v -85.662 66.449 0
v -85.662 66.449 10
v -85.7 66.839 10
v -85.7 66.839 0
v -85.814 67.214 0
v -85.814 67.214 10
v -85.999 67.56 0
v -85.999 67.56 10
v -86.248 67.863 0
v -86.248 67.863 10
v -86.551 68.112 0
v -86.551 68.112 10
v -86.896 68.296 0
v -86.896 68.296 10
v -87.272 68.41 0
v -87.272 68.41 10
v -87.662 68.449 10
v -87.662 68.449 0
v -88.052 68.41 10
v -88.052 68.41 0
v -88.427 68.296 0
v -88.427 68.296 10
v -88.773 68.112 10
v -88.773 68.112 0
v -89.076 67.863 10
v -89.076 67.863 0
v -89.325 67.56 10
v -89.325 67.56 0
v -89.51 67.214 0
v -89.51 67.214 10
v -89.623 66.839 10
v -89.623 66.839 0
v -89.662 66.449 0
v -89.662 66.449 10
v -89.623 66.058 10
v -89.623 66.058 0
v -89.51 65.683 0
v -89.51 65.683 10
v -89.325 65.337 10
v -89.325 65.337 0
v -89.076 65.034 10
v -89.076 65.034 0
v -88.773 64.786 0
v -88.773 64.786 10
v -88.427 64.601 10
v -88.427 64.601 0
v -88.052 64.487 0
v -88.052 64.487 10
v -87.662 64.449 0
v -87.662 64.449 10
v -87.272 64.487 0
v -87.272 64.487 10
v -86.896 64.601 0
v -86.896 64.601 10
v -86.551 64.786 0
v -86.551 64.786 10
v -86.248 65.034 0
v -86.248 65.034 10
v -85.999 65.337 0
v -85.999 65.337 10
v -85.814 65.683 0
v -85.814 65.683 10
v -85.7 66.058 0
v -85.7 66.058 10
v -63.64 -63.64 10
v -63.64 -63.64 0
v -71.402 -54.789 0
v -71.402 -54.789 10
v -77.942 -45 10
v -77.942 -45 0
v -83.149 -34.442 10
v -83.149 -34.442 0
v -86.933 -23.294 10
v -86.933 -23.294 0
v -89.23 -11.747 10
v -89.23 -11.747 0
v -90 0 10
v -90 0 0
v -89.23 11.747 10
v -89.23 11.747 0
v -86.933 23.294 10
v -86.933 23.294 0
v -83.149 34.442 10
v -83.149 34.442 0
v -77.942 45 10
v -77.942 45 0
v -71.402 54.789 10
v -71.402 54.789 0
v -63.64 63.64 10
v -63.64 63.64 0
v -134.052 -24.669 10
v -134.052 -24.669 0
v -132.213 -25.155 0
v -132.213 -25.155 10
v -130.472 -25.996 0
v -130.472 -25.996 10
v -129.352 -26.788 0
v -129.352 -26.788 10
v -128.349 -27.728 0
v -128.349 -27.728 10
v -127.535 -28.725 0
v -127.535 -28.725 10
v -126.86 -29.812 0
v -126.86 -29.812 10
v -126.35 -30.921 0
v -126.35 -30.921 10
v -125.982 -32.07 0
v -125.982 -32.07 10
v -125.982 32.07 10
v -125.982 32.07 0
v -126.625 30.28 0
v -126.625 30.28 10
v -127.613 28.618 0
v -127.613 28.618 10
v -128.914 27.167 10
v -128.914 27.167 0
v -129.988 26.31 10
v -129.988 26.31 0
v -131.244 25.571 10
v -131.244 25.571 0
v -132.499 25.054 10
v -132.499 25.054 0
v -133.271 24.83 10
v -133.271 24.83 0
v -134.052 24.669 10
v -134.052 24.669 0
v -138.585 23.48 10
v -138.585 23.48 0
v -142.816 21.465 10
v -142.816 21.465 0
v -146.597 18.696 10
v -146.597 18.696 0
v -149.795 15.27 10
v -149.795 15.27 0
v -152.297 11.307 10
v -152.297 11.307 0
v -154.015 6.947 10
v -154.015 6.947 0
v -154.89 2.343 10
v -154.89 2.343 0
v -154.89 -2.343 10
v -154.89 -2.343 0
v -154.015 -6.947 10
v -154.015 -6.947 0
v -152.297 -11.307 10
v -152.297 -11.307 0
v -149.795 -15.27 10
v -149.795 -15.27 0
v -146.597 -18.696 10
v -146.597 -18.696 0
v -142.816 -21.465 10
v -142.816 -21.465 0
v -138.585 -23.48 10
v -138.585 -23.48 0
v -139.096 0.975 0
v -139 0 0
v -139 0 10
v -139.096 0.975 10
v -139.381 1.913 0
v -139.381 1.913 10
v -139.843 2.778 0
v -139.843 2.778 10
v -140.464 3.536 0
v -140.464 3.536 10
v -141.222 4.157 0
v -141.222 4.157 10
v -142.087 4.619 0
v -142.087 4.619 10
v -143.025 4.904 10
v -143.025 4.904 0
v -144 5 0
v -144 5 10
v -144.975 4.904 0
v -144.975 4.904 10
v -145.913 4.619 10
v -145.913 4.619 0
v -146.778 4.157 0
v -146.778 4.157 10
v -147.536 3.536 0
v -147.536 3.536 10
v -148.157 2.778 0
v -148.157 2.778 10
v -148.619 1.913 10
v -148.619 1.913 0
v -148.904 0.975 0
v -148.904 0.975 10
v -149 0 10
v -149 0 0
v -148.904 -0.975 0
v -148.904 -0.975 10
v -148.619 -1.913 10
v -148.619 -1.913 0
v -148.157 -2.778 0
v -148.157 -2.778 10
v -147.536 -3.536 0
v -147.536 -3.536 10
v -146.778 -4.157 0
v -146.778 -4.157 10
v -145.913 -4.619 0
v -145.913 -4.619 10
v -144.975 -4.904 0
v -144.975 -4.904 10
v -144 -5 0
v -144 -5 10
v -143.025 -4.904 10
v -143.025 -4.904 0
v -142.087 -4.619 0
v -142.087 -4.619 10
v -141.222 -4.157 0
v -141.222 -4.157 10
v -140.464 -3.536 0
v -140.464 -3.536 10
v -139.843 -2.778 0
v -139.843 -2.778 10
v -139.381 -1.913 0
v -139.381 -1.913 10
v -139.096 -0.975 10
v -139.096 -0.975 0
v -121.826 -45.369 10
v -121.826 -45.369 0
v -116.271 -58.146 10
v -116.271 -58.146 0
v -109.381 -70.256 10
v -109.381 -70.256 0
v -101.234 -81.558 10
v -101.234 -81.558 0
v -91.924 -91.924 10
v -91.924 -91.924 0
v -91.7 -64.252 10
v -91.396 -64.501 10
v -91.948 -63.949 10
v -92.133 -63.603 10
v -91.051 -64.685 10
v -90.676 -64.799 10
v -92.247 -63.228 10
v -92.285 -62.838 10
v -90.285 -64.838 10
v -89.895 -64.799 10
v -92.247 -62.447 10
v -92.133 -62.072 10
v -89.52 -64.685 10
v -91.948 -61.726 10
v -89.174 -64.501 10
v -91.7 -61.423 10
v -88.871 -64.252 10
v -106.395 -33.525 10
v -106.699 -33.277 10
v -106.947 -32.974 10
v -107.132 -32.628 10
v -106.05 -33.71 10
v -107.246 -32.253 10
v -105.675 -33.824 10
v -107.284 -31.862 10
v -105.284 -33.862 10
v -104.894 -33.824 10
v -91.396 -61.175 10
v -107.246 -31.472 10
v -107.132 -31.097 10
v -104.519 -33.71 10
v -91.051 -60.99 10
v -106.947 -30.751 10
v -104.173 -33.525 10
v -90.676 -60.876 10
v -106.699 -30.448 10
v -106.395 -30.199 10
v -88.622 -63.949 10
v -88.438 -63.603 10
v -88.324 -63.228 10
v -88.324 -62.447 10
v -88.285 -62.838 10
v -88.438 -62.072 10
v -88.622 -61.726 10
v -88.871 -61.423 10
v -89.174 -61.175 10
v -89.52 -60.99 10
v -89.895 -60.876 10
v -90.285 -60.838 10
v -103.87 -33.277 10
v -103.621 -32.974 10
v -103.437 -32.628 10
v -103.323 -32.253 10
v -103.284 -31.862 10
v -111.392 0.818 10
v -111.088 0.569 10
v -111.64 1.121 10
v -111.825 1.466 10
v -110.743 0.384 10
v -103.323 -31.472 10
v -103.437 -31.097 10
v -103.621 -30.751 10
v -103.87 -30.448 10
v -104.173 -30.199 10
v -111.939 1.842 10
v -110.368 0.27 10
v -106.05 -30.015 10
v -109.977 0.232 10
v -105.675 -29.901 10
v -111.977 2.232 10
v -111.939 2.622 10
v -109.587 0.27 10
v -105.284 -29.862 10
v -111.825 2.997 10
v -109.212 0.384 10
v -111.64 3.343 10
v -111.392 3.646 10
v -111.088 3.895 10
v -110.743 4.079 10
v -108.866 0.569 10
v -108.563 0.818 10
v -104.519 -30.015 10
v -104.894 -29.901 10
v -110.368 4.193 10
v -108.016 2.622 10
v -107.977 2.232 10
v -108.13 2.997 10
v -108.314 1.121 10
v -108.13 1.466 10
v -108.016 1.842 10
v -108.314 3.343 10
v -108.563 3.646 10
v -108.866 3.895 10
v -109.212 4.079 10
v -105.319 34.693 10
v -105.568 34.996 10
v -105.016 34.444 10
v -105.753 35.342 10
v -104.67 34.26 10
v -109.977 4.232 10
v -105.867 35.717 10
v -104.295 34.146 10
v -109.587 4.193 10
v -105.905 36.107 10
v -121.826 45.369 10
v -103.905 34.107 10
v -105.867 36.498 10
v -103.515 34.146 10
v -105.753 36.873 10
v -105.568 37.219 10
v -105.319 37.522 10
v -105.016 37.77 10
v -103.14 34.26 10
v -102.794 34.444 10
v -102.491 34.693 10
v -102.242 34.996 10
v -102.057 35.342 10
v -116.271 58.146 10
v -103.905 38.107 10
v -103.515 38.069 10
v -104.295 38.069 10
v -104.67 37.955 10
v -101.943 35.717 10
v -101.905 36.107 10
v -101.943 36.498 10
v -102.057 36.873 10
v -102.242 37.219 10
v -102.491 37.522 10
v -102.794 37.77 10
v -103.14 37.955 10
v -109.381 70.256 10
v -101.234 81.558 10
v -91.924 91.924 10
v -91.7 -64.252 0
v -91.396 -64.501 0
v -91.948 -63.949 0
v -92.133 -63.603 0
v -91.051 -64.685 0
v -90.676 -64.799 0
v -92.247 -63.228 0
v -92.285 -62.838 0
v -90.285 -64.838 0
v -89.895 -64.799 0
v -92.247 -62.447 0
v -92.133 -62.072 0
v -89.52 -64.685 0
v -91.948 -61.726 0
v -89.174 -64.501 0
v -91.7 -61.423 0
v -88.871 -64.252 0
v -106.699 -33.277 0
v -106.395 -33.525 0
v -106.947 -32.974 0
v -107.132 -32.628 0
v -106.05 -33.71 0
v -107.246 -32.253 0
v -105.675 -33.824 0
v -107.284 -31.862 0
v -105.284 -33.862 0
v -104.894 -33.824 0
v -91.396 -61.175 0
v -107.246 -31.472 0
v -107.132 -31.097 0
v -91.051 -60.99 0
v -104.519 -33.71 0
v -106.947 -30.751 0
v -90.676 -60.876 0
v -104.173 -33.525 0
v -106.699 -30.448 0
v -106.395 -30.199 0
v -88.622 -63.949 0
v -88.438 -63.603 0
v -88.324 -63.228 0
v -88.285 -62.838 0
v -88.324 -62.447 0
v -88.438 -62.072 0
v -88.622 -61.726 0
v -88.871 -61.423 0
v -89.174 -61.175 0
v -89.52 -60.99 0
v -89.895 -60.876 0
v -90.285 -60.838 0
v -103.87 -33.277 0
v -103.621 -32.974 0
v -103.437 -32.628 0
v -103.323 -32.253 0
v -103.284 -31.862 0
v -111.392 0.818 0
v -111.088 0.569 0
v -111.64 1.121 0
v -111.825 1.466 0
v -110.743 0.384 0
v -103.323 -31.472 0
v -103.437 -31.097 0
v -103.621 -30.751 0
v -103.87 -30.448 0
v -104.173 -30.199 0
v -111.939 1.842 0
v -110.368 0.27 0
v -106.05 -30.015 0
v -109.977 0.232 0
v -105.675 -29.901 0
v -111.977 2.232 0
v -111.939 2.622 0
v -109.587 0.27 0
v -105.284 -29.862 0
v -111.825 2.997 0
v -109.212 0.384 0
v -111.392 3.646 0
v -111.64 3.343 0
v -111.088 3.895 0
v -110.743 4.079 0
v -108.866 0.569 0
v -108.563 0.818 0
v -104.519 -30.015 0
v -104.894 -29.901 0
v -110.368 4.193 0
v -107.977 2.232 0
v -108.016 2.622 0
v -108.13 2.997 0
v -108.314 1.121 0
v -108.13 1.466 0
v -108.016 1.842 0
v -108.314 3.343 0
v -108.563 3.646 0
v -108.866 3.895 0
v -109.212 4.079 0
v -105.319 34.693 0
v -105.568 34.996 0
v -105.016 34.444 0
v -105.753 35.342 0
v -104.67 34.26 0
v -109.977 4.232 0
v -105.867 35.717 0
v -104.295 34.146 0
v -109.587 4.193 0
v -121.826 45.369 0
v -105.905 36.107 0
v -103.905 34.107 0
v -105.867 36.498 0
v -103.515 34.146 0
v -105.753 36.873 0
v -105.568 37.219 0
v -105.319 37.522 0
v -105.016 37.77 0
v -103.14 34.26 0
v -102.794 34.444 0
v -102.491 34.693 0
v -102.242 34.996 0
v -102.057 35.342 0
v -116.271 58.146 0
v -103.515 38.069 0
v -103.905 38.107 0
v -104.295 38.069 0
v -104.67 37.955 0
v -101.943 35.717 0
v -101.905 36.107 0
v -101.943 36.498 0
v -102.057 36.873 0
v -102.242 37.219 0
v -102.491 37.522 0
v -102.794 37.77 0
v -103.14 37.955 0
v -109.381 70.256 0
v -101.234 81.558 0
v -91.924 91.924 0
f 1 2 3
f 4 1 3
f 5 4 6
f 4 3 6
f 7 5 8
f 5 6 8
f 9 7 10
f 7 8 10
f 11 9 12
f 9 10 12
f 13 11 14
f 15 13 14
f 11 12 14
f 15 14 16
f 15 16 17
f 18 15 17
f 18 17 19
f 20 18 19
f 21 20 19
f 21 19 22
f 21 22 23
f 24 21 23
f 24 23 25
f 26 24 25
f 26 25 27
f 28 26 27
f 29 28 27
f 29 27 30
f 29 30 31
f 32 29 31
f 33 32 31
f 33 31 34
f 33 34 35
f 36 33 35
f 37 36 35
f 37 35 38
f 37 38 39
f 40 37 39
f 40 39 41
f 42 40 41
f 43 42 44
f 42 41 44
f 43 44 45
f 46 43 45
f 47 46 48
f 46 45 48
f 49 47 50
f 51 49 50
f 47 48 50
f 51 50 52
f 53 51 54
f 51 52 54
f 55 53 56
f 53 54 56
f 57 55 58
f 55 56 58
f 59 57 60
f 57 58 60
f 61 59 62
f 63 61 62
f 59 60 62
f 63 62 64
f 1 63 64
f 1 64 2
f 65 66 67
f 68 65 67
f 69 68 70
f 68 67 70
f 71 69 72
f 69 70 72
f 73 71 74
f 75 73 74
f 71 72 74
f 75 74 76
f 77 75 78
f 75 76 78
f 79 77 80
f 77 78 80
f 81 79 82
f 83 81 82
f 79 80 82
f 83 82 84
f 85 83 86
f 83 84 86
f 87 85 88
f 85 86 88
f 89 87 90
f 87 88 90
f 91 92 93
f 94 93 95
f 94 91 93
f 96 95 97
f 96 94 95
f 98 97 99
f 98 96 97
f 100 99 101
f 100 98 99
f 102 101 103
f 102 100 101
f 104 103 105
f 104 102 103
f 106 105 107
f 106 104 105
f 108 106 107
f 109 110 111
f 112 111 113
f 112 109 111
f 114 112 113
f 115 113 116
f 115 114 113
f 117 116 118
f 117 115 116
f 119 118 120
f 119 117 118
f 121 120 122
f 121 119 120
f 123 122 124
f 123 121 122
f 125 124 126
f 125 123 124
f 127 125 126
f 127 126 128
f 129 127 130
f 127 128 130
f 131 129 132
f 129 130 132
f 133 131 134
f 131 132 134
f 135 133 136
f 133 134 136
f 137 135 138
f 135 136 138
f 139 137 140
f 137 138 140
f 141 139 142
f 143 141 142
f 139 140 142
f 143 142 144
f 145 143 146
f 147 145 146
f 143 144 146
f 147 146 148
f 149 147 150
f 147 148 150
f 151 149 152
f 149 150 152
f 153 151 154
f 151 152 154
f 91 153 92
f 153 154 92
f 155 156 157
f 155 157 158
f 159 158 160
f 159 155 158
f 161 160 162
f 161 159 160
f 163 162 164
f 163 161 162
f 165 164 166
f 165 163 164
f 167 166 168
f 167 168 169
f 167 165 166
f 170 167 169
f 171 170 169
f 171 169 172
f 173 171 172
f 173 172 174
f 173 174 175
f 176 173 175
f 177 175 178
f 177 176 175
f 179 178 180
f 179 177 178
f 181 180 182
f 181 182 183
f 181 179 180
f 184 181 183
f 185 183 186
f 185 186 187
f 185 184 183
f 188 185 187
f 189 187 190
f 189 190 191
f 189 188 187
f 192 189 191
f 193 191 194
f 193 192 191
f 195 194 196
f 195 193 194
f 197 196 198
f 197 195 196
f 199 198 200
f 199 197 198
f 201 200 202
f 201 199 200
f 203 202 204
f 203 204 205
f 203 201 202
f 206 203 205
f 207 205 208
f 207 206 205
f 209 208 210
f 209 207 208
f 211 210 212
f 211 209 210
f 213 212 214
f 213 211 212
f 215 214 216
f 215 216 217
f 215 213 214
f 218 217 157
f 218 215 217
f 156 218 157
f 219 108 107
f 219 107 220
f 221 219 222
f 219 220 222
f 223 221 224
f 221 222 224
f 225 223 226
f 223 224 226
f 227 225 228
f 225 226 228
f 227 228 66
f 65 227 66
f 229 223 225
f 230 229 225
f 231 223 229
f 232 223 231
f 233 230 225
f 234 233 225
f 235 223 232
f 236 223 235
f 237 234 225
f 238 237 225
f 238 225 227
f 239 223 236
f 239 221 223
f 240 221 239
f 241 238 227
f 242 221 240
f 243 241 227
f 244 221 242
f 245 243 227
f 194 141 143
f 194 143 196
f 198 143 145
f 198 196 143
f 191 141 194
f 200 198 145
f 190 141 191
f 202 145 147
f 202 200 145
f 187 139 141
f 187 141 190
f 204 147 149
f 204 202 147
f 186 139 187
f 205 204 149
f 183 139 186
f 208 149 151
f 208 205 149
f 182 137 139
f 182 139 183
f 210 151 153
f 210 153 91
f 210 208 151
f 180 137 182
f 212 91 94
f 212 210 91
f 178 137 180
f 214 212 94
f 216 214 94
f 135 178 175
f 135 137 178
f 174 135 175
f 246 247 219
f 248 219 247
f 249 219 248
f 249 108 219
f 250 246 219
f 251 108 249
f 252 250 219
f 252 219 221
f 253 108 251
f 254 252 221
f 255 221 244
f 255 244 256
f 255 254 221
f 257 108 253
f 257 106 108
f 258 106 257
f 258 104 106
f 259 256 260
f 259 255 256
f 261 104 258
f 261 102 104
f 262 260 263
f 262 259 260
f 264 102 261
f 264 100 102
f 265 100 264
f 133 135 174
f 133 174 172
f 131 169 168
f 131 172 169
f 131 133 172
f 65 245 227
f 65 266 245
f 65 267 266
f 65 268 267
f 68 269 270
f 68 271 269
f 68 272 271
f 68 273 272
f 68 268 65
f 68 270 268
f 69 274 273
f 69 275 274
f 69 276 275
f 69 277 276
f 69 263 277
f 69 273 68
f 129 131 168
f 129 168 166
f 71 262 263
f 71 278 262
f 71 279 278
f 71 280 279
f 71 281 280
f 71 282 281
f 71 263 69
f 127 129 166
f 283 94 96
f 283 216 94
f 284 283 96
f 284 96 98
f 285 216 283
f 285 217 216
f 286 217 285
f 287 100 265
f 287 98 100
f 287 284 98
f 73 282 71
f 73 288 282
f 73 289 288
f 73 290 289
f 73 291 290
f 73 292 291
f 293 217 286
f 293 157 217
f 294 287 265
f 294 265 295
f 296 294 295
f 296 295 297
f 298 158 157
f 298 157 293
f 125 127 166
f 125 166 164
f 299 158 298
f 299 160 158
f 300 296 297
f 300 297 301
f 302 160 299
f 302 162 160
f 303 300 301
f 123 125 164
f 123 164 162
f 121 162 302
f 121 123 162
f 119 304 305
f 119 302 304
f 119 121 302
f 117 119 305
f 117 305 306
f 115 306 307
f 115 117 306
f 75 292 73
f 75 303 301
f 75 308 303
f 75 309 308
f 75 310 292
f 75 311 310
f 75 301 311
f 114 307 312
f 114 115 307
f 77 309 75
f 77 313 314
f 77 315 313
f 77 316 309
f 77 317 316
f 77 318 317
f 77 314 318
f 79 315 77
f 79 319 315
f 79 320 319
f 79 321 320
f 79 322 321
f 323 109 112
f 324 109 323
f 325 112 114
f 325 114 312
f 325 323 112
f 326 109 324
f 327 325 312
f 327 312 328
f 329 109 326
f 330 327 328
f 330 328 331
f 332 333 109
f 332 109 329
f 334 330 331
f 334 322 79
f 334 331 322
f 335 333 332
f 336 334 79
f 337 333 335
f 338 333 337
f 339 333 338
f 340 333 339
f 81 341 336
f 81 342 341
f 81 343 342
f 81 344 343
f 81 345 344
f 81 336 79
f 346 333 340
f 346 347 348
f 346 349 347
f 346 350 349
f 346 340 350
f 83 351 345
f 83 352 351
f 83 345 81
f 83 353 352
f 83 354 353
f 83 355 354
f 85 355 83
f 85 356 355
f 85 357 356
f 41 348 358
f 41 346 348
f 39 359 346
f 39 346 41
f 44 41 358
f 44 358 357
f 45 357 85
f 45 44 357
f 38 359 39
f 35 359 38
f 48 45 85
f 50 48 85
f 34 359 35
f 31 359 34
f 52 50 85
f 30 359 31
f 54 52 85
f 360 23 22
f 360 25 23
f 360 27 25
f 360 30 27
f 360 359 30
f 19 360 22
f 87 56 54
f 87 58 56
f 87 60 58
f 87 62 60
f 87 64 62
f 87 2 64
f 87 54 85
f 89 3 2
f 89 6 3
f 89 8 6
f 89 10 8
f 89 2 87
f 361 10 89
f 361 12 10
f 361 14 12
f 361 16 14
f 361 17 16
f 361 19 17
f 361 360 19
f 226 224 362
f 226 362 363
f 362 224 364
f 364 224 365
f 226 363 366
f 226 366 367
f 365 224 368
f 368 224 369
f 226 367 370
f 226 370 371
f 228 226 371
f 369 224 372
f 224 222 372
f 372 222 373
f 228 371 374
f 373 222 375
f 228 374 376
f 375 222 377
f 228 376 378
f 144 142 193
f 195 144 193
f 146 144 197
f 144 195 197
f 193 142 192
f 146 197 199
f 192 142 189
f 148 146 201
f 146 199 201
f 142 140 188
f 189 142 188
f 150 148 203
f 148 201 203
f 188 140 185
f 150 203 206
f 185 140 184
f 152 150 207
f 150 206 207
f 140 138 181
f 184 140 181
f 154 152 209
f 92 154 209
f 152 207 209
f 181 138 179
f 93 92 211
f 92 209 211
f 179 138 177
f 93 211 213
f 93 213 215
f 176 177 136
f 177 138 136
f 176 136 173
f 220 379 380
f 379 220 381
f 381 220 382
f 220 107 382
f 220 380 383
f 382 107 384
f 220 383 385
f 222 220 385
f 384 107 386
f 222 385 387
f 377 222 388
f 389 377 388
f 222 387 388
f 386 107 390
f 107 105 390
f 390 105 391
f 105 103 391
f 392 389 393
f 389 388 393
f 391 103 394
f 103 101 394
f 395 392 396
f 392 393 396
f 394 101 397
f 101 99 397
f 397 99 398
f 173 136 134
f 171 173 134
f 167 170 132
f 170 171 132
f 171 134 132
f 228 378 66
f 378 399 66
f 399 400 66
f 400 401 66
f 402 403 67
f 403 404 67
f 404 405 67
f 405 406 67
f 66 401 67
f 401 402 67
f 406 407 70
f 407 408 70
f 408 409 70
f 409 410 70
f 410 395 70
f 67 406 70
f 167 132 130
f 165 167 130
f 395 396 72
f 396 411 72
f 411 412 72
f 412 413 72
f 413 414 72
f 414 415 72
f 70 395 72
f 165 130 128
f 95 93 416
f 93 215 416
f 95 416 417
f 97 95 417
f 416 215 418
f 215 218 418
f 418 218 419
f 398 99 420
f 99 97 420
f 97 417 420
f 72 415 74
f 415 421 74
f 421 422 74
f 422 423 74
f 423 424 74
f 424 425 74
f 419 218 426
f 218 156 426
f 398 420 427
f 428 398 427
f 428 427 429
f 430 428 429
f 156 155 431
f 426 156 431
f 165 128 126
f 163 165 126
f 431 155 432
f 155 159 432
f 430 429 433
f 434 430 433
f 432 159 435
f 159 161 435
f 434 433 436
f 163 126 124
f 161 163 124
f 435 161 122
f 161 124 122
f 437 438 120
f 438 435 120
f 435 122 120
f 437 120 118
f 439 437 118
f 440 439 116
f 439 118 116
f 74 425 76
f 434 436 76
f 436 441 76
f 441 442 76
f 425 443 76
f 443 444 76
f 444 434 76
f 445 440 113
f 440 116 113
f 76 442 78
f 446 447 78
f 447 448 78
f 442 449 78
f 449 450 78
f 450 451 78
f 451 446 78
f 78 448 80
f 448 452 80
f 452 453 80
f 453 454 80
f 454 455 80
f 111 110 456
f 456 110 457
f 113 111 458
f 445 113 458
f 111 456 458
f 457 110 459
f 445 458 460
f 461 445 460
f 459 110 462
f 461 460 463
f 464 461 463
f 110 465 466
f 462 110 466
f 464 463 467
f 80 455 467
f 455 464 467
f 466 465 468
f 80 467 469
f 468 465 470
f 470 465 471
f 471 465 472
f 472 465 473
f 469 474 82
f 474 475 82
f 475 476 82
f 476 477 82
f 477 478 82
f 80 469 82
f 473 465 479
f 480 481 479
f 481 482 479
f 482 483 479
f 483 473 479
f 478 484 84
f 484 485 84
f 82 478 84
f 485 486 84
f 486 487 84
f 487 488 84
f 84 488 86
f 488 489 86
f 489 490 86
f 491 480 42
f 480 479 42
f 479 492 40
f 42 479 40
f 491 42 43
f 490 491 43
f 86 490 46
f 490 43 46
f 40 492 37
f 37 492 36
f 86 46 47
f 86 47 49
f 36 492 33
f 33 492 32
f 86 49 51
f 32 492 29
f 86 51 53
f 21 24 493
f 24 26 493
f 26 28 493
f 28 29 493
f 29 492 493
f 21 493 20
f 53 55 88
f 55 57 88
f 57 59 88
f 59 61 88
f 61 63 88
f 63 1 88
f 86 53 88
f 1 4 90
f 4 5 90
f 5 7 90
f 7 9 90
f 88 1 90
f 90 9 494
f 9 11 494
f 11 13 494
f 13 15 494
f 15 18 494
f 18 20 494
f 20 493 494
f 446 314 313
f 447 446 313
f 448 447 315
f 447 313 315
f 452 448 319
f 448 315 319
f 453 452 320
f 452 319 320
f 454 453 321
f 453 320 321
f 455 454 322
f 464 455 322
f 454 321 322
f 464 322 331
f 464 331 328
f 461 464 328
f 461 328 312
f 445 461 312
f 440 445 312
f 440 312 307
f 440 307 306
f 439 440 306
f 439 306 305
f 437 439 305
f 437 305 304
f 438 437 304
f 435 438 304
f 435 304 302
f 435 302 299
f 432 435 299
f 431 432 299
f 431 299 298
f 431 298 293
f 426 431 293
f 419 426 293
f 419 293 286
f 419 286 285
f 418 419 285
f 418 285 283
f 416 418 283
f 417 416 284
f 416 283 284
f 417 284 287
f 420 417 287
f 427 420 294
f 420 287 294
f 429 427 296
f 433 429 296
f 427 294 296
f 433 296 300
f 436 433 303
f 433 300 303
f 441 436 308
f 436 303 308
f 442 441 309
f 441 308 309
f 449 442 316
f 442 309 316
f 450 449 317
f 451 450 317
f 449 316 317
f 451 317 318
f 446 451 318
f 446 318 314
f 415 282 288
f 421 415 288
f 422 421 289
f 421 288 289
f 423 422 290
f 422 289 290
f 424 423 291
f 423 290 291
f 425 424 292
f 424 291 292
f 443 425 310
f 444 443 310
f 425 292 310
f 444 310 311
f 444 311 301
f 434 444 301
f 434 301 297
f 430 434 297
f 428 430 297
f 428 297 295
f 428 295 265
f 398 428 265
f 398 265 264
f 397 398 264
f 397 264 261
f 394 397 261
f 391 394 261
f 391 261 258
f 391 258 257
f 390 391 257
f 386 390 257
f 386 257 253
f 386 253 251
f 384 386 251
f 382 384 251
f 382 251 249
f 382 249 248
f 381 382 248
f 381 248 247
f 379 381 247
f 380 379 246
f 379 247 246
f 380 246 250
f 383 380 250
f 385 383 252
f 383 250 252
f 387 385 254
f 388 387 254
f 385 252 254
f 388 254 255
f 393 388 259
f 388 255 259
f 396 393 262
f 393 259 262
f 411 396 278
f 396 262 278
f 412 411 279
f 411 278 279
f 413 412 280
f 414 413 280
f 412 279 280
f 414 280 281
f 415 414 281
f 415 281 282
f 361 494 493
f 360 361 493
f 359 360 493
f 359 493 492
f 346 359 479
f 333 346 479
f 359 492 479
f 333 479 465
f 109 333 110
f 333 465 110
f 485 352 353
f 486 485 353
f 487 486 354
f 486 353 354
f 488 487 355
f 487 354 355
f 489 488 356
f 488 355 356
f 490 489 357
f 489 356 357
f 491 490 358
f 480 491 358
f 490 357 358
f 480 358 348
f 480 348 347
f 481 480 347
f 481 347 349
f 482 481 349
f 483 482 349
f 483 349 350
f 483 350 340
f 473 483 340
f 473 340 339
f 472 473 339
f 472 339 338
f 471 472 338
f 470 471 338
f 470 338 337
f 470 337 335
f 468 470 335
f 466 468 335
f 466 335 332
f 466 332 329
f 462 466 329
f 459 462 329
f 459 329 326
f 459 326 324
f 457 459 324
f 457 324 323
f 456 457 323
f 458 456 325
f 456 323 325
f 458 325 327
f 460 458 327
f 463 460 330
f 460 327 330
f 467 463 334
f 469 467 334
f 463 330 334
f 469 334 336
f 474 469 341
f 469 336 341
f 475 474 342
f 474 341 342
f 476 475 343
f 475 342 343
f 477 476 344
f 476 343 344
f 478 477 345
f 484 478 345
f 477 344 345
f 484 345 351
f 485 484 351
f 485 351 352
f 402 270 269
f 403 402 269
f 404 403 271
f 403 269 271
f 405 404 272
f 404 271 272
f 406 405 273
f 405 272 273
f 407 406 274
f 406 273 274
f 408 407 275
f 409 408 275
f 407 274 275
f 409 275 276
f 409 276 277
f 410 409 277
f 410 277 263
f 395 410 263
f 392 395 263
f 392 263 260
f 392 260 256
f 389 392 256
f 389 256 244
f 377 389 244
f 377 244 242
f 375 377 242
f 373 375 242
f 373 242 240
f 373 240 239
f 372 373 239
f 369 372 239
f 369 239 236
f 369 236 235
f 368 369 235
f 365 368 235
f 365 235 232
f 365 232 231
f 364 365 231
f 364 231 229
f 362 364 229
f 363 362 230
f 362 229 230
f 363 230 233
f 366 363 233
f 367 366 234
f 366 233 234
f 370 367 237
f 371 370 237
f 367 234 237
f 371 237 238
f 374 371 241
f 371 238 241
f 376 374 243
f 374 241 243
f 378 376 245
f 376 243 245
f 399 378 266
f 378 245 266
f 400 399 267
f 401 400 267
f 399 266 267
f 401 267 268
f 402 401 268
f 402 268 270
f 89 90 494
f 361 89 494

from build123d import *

# Parameters (mm, degrees)
SKETCH2_R           = 5
BOSS_EXTRUDE1_DEPTH = 10
FILLET1_R           = 10
SKETCH3_R           = 2
CUT_EXTRUDE1_DEPTH  = 181.48545662


with BuildPart() as part:
    # Sketch2 → Boss-Extrude1 (new body)
    with BuildSketch(Plane.XY):
        with BuildLine():
            Line((-63.639610307, 63.639610307), (-91.923881554, 91.923881554))
            ThreePointArc((-91.923881554, 91.923881554), (-114.764290969, 61.066828299), (-127.596153846, 24.884162105))
            ThreePointArc((-127.596153846, 24.884162105), (-155, 0), (-127.596153846, -24.884162105))
            ThreePointArc((-127.596153846, -24.884162105), (-114.764290969, -61.066828299), (-91.923881554, -91.923881554))
            Line((-91.923881554, -91.923881554), (-63.639610307, -63.639610307))
            ThreePointArc((-63.639610307, -63.639610307), (-90, 0), (-63.639610307, 63.639610307))
        make_face()
        with Locations((-144, 0)):
            Circle(SKETCH2_R, mode=Mode.SUBTRACT)
    extrude(amount=BOSS_EXTRUDE1_DEPTH)

    # Fillet1
    fillet1_edges = [part.edges().sort_by_distance(p)[0] for p in [
        (-127.596153846, -24.884162105, 5),
        (-127.596153846, 24.884162105, 5),
    ]]
    fillet(fillet1_edges, radius=FILLET1_R)

    # Sketch3 → Cut-Extrude1 (cut, through all)
    with BuildSketch(Plane.XY.offset(10)):
        with Locations((-87.661776755, 66.448573319)):
            Circle(SKETCH3_R)
        with Locations((-103.90504242, 36.107369879)):
            Circle(SKETCH3_R)
        with Locations((-109.977358585, 2.231725501)):
            Circle(SKETCH3_R)
        with Locations((-105.284324634, -31.862375719)):
            Circle(SKETCH3_R)
        with Locations((-90.285327428, -62.837565605)):
            Circle(SKETCH3_R)
    extrude(amount=-CUT_EXTRUDE1_DEPTH, mode=Mode.SUBTRACT)


solid = part.part
